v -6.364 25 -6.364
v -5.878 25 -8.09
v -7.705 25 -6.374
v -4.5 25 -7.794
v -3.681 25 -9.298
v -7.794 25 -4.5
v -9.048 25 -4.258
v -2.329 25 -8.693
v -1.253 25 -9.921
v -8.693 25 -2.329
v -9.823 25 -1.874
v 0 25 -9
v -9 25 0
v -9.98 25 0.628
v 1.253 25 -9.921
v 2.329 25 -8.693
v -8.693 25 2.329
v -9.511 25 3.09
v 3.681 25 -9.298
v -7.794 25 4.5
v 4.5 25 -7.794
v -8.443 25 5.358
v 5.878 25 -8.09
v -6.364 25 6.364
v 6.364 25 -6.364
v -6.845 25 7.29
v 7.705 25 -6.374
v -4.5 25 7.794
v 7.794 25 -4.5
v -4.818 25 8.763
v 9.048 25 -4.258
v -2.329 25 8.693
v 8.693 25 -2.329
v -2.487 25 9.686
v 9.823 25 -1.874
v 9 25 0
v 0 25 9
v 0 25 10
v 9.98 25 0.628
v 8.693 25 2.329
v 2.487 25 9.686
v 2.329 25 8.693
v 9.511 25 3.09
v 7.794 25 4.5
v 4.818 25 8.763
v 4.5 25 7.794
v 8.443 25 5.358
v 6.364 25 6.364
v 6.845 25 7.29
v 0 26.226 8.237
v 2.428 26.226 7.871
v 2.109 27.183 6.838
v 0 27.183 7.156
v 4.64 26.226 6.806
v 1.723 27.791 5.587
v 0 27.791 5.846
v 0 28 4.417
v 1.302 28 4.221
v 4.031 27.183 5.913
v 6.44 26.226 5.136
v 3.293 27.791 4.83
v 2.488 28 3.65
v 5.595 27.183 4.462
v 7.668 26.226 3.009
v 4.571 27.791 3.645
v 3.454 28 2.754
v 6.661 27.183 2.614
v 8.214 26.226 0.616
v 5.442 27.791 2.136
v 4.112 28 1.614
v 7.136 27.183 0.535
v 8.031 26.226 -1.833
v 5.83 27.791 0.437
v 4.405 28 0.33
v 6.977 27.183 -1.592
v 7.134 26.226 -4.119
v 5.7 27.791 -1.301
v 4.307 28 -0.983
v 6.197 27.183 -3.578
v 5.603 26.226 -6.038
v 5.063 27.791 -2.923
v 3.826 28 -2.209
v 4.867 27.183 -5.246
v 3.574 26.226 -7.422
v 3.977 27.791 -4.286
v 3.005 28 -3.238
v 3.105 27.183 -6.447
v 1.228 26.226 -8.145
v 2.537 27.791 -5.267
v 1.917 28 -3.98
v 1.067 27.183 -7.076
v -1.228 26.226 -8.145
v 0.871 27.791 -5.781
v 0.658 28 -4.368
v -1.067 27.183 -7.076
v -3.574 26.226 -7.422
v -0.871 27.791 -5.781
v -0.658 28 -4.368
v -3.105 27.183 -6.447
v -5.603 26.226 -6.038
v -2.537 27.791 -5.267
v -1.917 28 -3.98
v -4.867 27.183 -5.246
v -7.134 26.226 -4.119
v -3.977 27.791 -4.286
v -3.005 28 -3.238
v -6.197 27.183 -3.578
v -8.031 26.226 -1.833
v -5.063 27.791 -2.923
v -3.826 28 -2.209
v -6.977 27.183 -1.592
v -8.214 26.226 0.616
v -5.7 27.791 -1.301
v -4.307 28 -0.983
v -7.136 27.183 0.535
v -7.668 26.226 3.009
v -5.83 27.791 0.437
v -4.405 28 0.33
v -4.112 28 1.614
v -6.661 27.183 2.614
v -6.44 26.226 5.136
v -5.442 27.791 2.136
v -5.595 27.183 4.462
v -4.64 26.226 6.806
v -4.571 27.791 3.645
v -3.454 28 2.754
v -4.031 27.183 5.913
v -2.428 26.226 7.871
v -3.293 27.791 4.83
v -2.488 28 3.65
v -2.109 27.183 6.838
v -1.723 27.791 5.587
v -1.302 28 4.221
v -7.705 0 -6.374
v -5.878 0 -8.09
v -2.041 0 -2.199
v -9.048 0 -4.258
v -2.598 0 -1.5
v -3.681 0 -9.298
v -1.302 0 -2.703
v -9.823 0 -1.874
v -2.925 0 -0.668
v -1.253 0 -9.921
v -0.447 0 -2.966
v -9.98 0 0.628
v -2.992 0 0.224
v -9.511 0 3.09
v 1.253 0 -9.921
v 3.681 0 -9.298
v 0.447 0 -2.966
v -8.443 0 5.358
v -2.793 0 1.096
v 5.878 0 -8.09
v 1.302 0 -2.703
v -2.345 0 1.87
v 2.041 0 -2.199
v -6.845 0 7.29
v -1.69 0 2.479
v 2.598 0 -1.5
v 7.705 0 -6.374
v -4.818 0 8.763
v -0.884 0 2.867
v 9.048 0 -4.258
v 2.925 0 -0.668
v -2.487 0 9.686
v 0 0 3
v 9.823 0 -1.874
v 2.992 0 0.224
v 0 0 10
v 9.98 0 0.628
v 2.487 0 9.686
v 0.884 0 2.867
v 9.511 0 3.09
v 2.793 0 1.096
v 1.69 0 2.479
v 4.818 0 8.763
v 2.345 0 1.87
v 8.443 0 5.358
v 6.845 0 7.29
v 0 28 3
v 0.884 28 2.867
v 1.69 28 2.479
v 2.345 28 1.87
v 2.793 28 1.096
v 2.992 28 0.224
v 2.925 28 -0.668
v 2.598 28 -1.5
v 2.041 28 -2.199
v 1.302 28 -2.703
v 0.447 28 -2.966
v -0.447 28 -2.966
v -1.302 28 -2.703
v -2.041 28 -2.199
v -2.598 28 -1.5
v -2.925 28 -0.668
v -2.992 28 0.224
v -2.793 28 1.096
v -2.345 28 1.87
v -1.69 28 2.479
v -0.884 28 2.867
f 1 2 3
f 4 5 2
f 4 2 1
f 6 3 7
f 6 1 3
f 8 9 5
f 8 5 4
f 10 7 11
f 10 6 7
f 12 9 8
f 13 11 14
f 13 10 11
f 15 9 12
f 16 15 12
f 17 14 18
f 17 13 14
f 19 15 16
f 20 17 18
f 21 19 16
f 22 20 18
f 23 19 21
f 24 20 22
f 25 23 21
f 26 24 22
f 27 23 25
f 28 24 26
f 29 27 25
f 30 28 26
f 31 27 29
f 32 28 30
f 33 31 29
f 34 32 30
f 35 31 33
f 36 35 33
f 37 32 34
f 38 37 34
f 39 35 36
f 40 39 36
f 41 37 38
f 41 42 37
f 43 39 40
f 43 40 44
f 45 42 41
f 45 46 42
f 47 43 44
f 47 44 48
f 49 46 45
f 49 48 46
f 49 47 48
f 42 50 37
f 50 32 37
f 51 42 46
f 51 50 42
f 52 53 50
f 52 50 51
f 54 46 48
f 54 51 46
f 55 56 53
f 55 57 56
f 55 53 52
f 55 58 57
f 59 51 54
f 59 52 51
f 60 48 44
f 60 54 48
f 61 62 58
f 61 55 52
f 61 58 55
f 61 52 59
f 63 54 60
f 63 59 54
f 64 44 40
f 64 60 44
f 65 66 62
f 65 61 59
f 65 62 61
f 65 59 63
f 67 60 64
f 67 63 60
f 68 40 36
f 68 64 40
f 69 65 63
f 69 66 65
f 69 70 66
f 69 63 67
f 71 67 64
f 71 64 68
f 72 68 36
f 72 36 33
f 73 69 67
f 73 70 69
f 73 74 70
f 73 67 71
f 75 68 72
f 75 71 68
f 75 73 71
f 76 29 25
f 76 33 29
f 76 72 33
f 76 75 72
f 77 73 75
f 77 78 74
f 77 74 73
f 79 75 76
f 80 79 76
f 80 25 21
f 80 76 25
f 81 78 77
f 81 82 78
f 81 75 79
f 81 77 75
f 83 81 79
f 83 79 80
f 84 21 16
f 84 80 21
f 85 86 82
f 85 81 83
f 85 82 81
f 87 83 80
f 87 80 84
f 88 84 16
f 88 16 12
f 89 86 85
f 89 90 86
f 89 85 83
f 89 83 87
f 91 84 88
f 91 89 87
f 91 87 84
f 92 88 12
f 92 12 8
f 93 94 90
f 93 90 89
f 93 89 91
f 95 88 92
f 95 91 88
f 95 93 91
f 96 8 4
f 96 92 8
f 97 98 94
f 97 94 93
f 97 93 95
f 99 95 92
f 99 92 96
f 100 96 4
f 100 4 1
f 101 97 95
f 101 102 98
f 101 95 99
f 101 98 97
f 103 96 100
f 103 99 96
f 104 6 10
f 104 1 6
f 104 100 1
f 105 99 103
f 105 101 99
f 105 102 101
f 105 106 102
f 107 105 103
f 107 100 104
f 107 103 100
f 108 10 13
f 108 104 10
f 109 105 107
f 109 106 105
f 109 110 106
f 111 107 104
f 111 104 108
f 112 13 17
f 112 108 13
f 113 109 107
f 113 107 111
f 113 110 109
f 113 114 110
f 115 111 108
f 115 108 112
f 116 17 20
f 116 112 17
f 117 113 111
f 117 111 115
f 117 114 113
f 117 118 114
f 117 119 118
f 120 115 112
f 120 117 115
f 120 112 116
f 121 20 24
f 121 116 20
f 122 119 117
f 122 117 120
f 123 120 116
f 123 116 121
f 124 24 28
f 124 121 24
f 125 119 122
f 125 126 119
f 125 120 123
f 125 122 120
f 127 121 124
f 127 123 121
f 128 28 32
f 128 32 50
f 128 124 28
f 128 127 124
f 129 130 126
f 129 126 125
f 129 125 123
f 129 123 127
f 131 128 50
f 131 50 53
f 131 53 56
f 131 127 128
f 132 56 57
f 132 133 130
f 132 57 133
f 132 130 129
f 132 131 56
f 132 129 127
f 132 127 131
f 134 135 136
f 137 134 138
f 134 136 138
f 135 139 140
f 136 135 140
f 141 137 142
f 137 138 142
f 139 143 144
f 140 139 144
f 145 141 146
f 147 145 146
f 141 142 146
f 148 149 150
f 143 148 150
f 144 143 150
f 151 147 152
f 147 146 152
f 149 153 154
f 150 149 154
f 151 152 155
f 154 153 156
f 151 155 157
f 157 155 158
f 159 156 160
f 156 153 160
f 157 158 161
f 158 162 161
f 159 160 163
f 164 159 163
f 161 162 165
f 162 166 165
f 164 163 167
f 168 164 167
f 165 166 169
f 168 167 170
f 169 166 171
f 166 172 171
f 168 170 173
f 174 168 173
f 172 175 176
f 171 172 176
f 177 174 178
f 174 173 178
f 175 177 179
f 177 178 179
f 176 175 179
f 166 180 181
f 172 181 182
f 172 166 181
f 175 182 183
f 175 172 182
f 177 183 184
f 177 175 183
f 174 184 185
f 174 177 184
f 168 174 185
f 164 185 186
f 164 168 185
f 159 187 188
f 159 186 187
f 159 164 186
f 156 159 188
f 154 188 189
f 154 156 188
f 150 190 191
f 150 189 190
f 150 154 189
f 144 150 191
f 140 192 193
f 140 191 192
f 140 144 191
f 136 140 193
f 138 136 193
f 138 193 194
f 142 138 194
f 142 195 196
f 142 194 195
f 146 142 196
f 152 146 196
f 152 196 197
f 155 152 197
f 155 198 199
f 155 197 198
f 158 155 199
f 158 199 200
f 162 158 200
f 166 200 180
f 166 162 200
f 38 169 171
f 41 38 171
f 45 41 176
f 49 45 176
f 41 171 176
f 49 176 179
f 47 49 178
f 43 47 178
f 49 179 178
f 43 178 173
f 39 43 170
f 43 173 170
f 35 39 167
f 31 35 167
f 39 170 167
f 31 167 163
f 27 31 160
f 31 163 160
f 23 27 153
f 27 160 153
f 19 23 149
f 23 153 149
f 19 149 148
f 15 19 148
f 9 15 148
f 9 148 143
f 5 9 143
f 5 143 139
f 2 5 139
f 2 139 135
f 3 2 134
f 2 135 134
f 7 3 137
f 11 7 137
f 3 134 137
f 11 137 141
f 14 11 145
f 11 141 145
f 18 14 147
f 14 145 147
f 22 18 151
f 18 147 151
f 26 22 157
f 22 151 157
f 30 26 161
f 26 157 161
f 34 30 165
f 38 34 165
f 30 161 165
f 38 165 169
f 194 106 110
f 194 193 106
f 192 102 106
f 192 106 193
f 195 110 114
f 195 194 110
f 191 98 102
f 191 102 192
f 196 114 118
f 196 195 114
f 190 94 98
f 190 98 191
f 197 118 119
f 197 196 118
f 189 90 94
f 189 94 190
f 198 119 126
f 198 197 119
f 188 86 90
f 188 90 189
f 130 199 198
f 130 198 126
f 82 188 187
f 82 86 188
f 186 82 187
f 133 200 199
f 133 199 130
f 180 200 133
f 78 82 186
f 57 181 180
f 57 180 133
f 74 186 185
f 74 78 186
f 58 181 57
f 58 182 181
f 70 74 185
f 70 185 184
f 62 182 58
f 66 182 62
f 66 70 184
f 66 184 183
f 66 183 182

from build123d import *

# Parameters (mm, degrees)
SKETCH1_R           = 10
BOSS_EXTRUDE2_DEPTH = 25
SKETCH2_R           = 9
BOSS_EXTRUDE3_DEPTH = 28
SKETCH3_R           = 3
CUT_EXTRUDE1_DEPTH  = 42
FILLET2_R           = 5


with BuildPart() as part:
    # Sketch1 → Boss-Extrude2 (new body)
    with BuildSketch(Plane(origin=(0, 0, 0), x_dir=(1, 0, 0), z_dir=(0, 1, 0))):
        with Locations(Location((0, 0, 0), (0, 0, 270))):
            Circle(SKETCH1_R)
    extrude(amount=BOSS_EXTRUDE2_DEPTH)

    # Sketch2 → Boss-Extrude3 (add)
    with BuildSketch(Plane(origin=(0, 0, 0), x_dir=(1, 0, 0), z_dir=(0, 1, 0))):
        with Locations(Location((0, 0, 0), (0, 0, 270))):
            Circle(SKETCH2_R)
    extrude(amount=BOSS_EXTRUDE3_DEPTH)

    # Sketch3 → Cut-Extrude1 (cut)
    with BuildSketch(Plane(origin=(0, 0, 0), x_dir=(1, 0, 0), z_dir=(0, 1, 0))):
        with Locations(Location((0, 0, 0), (0, 0, 270))):
            Circle(SKETCH3_R)
    extrude(amount=CUT_EXTRUDE1_DEPTH, mode=Mode.SUBTRACT)

    # Fillet2
    # the kernel refuses this fillet: 5 mm, written as the material it takes off along each edge
    with BuildSketch(Plane(origin=(0, 28, 0), x_dir=(0, 0, 1), z_dir=(-1, 0, 0))) as fillet2_piece_1:
        with BuildLine():
            CenterArc((4.417424305, -5), FILLET2_R, 23.578178478, 66.421821522)
            Line((4.417424305, 0), (4.417424305, 0.1))
            Line((4.417424305, 0.1), (9, 0.1))
            Line((9, 0.1), (9.1, 0))
            ThreePointArc((9.1, 0), (9.1, -1.5), (9.091651514, -2.96))
            Line((9.091651514, -2.96), (9, -3))
        make_face()
    revolve(axis=Axis((0, 28, 0), (0, 1, 0)), mode=Mode.SUBTRACT)


solid = part.part
